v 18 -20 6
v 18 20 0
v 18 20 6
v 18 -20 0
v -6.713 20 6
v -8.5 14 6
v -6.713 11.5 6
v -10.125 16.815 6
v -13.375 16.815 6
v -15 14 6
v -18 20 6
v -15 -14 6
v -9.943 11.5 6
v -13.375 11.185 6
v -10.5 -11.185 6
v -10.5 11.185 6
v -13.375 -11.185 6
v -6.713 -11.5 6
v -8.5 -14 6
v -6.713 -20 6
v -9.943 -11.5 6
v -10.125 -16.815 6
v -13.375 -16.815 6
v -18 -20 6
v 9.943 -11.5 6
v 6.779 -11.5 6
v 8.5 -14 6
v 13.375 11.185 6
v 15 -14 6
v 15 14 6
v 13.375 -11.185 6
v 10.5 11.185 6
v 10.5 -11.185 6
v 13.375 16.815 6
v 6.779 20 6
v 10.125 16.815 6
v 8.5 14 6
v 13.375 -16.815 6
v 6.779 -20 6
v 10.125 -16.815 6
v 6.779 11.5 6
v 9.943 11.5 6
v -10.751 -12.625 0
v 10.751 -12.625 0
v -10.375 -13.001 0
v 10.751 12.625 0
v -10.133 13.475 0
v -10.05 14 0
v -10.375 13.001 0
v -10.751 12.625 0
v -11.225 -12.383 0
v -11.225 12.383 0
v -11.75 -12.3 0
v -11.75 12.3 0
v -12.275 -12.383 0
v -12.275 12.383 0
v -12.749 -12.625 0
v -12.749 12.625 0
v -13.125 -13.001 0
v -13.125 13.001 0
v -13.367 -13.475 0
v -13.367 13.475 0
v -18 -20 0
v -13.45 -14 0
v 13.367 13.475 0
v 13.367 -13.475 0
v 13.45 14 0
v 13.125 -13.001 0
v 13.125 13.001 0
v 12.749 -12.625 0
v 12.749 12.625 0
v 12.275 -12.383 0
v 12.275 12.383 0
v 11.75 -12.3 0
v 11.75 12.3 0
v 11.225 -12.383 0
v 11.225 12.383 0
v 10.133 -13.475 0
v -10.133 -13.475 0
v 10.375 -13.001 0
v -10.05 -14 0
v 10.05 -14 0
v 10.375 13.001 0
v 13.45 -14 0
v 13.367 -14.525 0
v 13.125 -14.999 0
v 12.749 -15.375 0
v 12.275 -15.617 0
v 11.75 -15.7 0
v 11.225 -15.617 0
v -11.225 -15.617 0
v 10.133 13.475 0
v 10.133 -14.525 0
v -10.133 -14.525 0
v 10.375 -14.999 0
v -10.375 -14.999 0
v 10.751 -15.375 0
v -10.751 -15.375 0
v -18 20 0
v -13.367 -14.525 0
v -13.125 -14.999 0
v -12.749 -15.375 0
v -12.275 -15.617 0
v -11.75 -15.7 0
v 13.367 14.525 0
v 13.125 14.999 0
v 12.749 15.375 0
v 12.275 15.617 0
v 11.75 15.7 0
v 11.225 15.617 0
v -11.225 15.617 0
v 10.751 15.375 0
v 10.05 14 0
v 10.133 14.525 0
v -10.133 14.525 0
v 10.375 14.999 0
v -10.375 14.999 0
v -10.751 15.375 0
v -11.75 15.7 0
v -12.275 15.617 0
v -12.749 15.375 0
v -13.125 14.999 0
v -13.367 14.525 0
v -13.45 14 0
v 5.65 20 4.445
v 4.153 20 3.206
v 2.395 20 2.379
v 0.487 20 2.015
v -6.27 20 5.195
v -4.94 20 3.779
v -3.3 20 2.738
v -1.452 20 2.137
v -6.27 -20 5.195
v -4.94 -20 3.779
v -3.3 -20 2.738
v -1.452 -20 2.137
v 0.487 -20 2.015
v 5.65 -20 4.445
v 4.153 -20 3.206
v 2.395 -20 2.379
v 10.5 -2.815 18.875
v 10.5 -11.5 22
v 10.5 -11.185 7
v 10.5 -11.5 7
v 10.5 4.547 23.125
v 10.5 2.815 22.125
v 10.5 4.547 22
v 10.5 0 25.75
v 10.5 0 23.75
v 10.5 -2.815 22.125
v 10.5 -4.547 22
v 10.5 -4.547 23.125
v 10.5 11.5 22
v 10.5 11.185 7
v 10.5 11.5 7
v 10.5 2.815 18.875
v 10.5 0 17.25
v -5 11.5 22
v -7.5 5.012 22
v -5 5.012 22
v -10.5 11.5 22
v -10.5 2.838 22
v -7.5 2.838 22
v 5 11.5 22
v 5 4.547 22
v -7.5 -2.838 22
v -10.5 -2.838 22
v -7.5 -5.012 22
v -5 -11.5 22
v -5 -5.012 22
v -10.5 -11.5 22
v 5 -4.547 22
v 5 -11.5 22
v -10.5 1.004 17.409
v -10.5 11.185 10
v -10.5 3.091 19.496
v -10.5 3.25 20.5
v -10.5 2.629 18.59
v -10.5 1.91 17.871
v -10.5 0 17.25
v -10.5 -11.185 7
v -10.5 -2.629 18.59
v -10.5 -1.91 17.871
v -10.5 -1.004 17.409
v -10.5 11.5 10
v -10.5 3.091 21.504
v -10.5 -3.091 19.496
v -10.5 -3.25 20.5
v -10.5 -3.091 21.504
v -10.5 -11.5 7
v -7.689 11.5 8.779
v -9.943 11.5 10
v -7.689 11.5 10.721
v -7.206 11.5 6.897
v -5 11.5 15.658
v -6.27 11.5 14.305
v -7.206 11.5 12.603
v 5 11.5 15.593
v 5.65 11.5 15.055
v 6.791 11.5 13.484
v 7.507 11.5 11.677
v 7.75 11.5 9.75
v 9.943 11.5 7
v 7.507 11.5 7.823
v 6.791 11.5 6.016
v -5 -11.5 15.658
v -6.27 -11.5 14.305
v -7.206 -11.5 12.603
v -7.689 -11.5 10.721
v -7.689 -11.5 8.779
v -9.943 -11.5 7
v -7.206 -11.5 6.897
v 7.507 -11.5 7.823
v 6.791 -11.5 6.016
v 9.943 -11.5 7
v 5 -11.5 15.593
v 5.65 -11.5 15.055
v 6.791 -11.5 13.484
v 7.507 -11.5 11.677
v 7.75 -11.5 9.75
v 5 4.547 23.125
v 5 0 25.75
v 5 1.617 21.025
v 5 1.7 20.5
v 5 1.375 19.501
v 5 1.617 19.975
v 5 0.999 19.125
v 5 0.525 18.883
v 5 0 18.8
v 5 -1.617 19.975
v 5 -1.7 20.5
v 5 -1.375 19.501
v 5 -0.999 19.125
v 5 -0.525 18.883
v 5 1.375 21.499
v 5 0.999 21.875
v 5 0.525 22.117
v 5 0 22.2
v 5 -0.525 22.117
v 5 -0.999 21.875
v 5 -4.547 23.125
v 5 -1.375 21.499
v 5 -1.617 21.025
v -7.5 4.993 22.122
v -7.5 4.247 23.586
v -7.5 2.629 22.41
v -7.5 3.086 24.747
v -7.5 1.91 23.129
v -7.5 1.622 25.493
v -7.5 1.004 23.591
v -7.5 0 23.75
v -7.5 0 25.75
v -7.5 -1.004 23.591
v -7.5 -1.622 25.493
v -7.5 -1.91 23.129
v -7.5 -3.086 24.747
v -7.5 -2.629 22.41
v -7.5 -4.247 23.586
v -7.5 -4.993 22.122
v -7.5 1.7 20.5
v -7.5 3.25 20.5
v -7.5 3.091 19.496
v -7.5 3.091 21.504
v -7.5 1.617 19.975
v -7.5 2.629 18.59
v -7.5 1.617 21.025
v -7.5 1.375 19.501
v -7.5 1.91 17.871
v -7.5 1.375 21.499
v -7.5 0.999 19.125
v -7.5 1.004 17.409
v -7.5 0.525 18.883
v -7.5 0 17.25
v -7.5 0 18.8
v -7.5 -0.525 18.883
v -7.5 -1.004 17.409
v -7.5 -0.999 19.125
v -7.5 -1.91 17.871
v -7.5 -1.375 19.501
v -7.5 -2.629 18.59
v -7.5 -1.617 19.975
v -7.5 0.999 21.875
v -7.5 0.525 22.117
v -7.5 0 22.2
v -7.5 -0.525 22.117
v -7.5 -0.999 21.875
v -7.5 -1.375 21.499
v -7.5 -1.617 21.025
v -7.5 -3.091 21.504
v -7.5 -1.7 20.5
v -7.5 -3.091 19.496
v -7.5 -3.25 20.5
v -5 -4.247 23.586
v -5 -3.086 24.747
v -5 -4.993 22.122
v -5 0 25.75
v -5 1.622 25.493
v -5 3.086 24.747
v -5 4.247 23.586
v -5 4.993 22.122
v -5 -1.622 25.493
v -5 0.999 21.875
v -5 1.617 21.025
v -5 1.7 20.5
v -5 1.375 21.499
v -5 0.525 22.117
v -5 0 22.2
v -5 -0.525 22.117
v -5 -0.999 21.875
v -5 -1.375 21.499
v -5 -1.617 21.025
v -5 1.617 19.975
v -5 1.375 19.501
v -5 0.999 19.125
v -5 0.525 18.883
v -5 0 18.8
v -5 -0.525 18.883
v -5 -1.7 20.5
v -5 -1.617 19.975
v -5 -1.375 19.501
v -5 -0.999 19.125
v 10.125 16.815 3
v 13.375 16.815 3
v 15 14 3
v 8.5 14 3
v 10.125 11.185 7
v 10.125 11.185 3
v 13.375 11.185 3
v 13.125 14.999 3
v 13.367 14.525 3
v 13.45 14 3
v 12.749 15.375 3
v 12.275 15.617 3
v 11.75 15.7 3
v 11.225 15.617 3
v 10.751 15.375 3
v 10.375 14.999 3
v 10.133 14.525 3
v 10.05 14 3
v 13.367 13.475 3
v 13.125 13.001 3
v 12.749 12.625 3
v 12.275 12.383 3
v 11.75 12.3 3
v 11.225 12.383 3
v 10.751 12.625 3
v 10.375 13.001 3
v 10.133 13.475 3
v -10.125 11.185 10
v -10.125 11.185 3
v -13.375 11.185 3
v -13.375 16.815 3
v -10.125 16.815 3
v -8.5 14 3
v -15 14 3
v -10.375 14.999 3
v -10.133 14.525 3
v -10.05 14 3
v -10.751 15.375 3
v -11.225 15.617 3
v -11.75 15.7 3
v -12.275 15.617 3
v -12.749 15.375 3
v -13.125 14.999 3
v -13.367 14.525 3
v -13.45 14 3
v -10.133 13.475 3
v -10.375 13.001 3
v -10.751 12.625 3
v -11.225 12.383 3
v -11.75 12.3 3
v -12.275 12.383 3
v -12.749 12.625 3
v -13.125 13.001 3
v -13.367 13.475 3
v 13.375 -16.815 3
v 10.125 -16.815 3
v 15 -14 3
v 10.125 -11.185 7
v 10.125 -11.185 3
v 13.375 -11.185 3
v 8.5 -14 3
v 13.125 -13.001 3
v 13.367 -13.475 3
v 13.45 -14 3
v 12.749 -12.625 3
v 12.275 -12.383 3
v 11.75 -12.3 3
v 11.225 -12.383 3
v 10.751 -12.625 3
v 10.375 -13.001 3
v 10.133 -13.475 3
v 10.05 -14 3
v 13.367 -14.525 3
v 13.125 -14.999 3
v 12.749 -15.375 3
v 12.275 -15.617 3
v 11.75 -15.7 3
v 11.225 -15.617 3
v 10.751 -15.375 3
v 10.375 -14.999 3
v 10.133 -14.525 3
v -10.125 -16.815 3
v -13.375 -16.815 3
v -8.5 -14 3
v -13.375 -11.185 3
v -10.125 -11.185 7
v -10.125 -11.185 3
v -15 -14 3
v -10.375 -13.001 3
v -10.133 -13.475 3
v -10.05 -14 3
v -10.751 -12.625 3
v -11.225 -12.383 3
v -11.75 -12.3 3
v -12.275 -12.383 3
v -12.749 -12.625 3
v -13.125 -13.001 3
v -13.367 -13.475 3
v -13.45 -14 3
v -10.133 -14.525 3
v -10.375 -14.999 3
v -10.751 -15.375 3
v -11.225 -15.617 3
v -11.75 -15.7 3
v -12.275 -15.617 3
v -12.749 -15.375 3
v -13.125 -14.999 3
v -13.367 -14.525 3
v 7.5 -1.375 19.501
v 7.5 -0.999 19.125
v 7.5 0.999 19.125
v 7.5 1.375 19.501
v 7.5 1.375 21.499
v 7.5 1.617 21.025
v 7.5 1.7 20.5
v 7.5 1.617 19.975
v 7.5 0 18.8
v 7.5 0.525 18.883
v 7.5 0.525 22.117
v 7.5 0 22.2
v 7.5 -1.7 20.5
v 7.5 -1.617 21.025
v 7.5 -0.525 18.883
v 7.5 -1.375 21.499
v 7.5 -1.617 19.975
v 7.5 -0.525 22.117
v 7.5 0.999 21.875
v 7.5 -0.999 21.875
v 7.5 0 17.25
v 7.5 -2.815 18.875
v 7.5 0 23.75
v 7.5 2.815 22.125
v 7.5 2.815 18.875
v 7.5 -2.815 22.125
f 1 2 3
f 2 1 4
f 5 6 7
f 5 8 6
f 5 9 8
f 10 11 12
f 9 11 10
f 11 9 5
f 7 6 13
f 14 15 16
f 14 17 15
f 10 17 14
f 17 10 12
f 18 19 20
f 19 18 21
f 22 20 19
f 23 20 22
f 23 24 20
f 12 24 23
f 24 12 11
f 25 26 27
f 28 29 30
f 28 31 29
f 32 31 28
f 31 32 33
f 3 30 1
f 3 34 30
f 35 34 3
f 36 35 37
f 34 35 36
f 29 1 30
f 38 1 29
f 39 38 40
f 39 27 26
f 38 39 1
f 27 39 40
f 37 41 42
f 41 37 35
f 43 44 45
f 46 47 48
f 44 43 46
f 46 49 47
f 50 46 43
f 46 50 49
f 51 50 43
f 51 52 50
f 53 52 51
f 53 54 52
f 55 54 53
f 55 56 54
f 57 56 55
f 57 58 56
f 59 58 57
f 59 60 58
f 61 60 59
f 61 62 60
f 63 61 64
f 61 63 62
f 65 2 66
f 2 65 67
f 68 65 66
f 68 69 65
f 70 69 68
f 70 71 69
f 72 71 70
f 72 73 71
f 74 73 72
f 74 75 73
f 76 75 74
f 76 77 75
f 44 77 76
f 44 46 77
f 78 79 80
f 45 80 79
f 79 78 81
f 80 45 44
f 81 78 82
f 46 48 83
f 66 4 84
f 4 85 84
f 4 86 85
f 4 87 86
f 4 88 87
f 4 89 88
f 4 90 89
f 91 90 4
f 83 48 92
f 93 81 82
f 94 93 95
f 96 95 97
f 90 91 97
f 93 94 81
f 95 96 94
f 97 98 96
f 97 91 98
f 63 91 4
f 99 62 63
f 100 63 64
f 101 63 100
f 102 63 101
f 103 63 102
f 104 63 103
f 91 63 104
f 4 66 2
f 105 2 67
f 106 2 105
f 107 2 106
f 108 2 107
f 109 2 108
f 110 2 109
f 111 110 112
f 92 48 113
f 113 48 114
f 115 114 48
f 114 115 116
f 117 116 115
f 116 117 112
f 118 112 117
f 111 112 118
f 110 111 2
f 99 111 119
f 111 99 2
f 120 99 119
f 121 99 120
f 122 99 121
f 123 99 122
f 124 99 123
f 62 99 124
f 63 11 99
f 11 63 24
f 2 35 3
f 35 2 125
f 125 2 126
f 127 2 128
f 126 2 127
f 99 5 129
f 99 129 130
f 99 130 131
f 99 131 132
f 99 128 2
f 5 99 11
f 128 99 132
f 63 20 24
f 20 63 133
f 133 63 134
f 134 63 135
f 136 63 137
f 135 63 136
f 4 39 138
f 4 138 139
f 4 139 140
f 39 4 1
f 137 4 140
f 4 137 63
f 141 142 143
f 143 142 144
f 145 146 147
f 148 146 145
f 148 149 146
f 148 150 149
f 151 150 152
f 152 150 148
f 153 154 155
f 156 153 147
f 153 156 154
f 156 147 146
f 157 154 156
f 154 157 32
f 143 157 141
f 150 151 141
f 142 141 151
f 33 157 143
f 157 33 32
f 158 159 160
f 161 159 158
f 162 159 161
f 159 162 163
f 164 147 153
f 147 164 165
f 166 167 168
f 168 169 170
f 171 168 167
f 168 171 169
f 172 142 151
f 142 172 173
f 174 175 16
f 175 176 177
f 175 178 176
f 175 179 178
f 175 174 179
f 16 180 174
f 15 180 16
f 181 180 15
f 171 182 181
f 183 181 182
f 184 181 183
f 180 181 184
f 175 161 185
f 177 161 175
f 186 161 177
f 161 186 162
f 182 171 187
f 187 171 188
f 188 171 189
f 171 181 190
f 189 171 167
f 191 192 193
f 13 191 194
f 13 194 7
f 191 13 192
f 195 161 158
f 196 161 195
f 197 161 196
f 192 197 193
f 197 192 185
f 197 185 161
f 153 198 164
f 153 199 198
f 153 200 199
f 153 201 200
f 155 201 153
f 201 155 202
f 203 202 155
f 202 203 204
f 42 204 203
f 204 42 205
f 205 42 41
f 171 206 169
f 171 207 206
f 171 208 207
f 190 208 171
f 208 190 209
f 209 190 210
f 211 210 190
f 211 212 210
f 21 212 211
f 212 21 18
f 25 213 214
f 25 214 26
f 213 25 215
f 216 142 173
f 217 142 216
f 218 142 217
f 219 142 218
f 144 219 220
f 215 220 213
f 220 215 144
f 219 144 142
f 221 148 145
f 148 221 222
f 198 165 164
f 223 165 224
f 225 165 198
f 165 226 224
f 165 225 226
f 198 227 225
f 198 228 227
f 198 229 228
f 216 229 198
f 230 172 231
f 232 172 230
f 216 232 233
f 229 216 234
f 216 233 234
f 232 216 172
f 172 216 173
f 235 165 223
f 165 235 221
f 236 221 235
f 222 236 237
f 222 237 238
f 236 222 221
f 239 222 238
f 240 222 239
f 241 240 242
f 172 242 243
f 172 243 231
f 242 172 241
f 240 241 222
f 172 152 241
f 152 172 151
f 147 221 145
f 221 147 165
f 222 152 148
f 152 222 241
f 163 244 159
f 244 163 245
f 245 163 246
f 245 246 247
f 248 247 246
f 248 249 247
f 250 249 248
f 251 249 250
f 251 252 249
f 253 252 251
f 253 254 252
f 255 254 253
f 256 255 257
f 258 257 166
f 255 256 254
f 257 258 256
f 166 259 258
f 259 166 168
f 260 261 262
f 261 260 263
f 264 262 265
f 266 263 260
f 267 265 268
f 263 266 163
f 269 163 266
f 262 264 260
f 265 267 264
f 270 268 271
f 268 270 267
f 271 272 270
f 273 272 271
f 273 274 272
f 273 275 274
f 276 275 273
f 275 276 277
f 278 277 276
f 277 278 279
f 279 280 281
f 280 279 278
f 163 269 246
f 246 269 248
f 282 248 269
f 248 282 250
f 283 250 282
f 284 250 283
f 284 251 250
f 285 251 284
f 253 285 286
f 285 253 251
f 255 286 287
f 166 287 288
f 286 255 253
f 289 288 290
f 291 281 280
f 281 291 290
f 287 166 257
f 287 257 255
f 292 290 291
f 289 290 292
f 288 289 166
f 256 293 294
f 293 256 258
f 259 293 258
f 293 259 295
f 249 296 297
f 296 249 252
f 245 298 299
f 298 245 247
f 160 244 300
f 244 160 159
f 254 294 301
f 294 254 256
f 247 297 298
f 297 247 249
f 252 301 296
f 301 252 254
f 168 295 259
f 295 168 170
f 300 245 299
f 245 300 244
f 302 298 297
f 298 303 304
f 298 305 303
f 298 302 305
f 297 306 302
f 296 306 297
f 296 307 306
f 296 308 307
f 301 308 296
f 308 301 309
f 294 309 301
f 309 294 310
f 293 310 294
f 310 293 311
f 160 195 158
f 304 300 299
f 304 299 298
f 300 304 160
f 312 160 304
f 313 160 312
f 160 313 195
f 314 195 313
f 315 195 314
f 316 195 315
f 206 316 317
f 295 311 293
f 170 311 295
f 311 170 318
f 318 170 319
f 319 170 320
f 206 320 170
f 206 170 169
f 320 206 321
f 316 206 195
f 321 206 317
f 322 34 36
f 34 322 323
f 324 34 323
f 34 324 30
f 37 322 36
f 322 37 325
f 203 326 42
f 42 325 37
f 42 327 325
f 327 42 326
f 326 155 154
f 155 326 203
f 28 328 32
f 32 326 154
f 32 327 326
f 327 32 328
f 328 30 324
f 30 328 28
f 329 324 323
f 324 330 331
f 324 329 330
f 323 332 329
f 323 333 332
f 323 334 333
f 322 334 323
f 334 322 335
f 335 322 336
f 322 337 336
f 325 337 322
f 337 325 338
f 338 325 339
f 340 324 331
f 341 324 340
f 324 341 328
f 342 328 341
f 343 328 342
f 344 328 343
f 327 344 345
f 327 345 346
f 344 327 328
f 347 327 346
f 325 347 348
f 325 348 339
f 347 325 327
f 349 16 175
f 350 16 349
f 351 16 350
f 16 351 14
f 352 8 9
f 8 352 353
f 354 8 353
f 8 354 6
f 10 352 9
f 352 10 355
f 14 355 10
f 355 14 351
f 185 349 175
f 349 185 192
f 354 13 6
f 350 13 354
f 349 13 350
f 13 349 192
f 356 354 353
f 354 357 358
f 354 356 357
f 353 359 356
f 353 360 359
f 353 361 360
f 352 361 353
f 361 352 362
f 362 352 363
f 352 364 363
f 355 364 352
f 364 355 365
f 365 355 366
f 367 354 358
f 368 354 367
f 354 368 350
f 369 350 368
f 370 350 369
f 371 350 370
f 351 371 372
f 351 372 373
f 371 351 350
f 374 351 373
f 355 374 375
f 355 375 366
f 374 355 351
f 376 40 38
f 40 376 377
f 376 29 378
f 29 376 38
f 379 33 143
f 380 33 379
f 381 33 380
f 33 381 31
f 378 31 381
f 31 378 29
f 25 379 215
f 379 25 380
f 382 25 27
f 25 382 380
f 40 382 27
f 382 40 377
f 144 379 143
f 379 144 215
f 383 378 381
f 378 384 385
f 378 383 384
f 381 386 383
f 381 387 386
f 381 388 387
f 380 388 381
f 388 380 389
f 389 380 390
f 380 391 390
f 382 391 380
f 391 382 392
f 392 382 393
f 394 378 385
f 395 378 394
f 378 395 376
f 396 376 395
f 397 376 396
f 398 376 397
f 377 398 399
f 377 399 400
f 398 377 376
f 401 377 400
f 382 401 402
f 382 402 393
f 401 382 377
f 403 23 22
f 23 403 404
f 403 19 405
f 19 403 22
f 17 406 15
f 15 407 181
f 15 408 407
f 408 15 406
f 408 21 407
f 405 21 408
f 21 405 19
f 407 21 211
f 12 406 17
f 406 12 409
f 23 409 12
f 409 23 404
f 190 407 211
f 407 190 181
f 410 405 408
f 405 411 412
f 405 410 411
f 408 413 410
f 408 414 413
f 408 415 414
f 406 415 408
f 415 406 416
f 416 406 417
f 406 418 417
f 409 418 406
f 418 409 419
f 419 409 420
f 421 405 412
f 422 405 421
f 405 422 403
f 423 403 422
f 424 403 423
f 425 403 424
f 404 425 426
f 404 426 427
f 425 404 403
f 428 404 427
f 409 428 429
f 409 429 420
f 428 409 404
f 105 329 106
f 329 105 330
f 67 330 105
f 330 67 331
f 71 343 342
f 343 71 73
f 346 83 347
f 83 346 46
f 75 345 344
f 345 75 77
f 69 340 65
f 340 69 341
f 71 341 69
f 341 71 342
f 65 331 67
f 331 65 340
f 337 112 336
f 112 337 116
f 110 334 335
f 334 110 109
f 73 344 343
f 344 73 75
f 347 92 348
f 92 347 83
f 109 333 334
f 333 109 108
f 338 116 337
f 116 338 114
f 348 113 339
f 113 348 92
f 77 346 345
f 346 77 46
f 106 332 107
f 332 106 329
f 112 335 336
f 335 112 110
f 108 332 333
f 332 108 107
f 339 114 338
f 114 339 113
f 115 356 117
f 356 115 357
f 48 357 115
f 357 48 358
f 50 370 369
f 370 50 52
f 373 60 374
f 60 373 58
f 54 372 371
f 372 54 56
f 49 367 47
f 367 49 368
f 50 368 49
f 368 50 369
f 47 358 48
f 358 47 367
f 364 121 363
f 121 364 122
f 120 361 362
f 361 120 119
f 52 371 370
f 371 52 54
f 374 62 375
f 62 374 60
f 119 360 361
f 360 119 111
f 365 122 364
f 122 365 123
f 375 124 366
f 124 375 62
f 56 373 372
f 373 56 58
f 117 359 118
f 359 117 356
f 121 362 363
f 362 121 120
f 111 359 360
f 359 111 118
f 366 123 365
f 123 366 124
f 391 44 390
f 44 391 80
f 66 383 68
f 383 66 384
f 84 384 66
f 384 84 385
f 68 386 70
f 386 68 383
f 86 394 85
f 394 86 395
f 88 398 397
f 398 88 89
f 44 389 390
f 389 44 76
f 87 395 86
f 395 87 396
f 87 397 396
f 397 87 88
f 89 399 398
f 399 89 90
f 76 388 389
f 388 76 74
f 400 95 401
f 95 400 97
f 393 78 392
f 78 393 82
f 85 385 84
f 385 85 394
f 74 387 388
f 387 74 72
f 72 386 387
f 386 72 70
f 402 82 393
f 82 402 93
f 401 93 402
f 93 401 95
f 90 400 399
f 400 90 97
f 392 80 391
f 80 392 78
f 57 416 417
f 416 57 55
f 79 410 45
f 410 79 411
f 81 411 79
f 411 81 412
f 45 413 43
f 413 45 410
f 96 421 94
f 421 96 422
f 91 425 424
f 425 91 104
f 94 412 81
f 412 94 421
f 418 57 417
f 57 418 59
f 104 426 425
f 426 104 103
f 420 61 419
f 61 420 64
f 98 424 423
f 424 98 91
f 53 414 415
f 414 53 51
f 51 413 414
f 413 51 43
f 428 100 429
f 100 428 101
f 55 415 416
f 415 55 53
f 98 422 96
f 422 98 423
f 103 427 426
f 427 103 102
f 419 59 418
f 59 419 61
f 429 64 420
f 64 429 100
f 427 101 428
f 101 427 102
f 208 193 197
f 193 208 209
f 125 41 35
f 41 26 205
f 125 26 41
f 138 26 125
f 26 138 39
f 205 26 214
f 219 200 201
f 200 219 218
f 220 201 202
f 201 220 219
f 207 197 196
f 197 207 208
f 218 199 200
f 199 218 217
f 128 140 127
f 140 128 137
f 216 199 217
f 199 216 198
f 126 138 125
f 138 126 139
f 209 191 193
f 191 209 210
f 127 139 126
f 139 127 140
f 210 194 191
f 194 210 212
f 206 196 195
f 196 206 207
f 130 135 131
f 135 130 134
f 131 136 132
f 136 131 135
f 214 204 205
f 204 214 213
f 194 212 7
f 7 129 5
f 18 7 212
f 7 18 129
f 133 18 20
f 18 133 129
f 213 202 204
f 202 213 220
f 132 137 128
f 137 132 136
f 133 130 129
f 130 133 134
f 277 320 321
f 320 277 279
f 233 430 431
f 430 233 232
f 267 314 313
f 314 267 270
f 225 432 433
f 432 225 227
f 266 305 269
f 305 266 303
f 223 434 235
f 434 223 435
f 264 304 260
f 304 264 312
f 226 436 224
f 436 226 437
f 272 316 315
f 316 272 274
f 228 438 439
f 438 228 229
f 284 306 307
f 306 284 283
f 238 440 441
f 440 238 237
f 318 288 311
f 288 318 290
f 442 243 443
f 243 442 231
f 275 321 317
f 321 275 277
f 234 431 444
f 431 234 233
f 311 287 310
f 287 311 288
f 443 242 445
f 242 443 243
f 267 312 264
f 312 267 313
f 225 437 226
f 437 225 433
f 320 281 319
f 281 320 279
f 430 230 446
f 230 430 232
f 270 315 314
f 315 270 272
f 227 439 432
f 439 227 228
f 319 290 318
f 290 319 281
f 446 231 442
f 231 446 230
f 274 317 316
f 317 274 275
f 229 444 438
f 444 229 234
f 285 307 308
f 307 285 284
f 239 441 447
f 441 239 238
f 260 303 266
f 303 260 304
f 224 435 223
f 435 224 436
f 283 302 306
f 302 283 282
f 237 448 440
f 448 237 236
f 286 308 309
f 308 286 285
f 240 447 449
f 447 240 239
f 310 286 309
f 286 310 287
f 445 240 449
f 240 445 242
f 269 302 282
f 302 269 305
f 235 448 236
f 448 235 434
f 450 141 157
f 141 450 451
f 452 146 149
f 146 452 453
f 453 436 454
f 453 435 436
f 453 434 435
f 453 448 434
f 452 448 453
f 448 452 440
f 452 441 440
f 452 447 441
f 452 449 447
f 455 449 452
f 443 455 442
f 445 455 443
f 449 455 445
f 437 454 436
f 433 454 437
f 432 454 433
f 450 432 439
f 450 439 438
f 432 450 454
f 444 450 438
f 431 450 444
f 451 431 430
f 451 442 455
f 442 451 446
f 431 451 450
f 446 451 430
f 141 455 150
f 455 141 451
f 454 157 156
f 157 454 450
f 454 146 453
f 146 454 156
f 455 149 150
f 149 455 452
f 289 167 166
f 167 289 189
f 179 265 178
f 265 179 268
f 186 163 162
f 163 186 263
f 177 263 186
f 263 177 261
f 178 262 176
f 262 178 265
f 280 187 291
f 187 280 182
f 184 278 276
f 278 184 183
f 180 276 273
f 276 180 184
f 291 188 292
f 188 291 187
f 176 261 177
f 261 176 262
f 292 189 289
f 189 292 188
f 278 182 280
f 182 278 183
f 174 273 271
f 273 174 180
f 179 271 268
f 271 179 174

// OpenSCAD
// LM8UU bushing holder
// Inspired/derived from:
//http://www.thingiverse.com/thing:14942
//Which is derived from:
// http://www.thingiverse.com/thing:14814
//And is a drop-in replacement for:
//http://www.thingiverse.com/thing:10287



// screw/nut dimensions
screw_dia = 3.4;
nut_dia = 6.5;
nut_height=3;

// main body dimensions
body_width = 21;
gap_width = 10;
body_height = 22;
body_length=40;
LM8UU_dia = 15.5;
screw_elevation = body_height-1.5;

//mounting plate dimensions
plate_height = 6;
plate_length=body_length;
plate_width=36;
screw_space_x = 23.5;
screw_space_y=28;
lm8uu_length=23;

module mount_plate()
{
	difference()
	{
		//bottom plate
		translate([-plate_width/2,-plate_length/2,0])
			cube([plate_width,plate_length,plate_height]);
	if (false) {
		//screw holes
		translate([screw_space_x/2,screw_space_y/2,-0.1])
			cylinder(r=screw_dia/2, h=plate_height+1, $fn=20);
		translate([-screw_space_x/2,screw_space_y/2,-0.1])
			cylinder(r=screw_dia/2, h=plate_height+1, $fn=20);
		translate([screw_space_x/2,-screw_space_y/2,-0.1])
			cylinder(r=screw_dia/2, h=plate_height+1, $fn=20);
		translate([-screw_space_x/2,-screw_space_y/2,-0.1])
			cylinder(r=screw_dia/2, h=plate_height+1, $fn=20);

		//nut traps
		translate([screw_space_x/2,screw_space_y/2,plate_height-nut_height])
			cylinder(r=nut_dia/2, h=plate_height+1, $fn=6);
		translate([-screw_space_x/2,screw_space_y/2,plate_height-nut_height])
			cylinder(r=nut_dia/2, h=plate_height+1, $fn=6);
		translate([screw_space_x/2,-screw_space_y/2,plate_height-nut_height])
			cylinder(r=nut_dia/2, h=plate_height+1, $fn=6);
		translate([-screw_space_x/2,-screw_space_y/2,plate_height-nut_height])
			cylinder(r=nut_dia/2, h=plate_height+1, $fn=6);
	}
	}
}

// main body
difference()
{
	union()
	{
		mount_plate();

		//translate([-body_width/2,-body_length/2,0])
			//cube([body_width,body_length,body_height]);
		//translate([-body_width/2,(-body_length/2)+8.5,0])
		translate([-body_width/2,-(lm8uu_length/2),0])
			cube([body_width,lm8uu_length,body_height]);

		// nut trap surround
		translate([gap_width/2,0,screw_elevation])
			rotate([0,90,0])
				cylinder(r=nut_dia/2+2, h=body_width/2 - gap_width/2, $fn=6);

		// Screw hole surround
		translate([-gap_width/2,0,screw_elevation])
			rotate([0,-90,0])
				cylinder(r=nut_dia/2+2, h=(body_width-gap_width)/2 - nut_height, $fn=20);
	}

	// bushing hole
	translate([0,0,LM8UU_dia/2+2])
		rotate([90,0,0])
			cylinder(r=LM8UU_dia/2, h=body_length+0.1, center=true);

	// top gap
	translate([0,0,20])
		cube([gap_width,body_length+0.1,20],center=true);

	// screw hole (one all the way through)
	translate([0,0,screw_elevation])
		rotate([0,90,0])
			cylinder(r=screw_dia/2, h=30, center=true, $fn=20);

	// nut trap
	translate([body_width/2-nut_height,0,screw_elevation])
		rotate([0,90,0])
			cylinder(r=nut_dia/2, h=nut_height+.01,$fn=6);

	// Screw hole
	translate([-(body_width/2-nut_height),0,screw_elevation])
		rotate([0,-90,0])
			cylinder(r=nut_dia/2, h=nut_height+.01,$fn=20);
if (true) {
		//nut traps
		translate([screw_space_x/2,screw_space_y/2,plate_height-nut_height])
			cylinder(r=nut_dia/2, h=plate_height-2, $fn=6);
		translate([-screw_space_x/2,screw_space_y/2,plate_height-nut_height])
			cylinder(r=nut_dia/2, h=plate_height+1, $fn=6);
		translate([screw_space_x/2,-screw_space_y/2,plate_height-nut_height])
			cylinder(r=nut_dia/2, h=plate_height-2, $fn=6);
		translate([-screw_space_x/2,-screw_space_y/2,plate_height-nut_height])
			cylinder(r=nut_dia/2, h=plate_height-2, $fn=6);

		//screw holes
		translate([screw_space_x/2,screw_space_y/2,-0.1])
			cylinder(r=screw_dia/2, h=plate_height+1, $fn=20);
		translate([-screw_space_x/2,screw_space_y/2,-0.1])
			cylinder(r=screw_dia/2, h=plate_height+1, $fn=20);
		translate([screw_space_x/2,-screw_space_y/2,-0.1])
			cylinder(r=screw_dia/2, h=plate_height+1, $fn=20);
		translate([-screw_space_x/2,-screw_space_y/2,-0.1])
			cylinder(r=screw_dia/2, h=plate_height+1, $fn=20);
}

}
